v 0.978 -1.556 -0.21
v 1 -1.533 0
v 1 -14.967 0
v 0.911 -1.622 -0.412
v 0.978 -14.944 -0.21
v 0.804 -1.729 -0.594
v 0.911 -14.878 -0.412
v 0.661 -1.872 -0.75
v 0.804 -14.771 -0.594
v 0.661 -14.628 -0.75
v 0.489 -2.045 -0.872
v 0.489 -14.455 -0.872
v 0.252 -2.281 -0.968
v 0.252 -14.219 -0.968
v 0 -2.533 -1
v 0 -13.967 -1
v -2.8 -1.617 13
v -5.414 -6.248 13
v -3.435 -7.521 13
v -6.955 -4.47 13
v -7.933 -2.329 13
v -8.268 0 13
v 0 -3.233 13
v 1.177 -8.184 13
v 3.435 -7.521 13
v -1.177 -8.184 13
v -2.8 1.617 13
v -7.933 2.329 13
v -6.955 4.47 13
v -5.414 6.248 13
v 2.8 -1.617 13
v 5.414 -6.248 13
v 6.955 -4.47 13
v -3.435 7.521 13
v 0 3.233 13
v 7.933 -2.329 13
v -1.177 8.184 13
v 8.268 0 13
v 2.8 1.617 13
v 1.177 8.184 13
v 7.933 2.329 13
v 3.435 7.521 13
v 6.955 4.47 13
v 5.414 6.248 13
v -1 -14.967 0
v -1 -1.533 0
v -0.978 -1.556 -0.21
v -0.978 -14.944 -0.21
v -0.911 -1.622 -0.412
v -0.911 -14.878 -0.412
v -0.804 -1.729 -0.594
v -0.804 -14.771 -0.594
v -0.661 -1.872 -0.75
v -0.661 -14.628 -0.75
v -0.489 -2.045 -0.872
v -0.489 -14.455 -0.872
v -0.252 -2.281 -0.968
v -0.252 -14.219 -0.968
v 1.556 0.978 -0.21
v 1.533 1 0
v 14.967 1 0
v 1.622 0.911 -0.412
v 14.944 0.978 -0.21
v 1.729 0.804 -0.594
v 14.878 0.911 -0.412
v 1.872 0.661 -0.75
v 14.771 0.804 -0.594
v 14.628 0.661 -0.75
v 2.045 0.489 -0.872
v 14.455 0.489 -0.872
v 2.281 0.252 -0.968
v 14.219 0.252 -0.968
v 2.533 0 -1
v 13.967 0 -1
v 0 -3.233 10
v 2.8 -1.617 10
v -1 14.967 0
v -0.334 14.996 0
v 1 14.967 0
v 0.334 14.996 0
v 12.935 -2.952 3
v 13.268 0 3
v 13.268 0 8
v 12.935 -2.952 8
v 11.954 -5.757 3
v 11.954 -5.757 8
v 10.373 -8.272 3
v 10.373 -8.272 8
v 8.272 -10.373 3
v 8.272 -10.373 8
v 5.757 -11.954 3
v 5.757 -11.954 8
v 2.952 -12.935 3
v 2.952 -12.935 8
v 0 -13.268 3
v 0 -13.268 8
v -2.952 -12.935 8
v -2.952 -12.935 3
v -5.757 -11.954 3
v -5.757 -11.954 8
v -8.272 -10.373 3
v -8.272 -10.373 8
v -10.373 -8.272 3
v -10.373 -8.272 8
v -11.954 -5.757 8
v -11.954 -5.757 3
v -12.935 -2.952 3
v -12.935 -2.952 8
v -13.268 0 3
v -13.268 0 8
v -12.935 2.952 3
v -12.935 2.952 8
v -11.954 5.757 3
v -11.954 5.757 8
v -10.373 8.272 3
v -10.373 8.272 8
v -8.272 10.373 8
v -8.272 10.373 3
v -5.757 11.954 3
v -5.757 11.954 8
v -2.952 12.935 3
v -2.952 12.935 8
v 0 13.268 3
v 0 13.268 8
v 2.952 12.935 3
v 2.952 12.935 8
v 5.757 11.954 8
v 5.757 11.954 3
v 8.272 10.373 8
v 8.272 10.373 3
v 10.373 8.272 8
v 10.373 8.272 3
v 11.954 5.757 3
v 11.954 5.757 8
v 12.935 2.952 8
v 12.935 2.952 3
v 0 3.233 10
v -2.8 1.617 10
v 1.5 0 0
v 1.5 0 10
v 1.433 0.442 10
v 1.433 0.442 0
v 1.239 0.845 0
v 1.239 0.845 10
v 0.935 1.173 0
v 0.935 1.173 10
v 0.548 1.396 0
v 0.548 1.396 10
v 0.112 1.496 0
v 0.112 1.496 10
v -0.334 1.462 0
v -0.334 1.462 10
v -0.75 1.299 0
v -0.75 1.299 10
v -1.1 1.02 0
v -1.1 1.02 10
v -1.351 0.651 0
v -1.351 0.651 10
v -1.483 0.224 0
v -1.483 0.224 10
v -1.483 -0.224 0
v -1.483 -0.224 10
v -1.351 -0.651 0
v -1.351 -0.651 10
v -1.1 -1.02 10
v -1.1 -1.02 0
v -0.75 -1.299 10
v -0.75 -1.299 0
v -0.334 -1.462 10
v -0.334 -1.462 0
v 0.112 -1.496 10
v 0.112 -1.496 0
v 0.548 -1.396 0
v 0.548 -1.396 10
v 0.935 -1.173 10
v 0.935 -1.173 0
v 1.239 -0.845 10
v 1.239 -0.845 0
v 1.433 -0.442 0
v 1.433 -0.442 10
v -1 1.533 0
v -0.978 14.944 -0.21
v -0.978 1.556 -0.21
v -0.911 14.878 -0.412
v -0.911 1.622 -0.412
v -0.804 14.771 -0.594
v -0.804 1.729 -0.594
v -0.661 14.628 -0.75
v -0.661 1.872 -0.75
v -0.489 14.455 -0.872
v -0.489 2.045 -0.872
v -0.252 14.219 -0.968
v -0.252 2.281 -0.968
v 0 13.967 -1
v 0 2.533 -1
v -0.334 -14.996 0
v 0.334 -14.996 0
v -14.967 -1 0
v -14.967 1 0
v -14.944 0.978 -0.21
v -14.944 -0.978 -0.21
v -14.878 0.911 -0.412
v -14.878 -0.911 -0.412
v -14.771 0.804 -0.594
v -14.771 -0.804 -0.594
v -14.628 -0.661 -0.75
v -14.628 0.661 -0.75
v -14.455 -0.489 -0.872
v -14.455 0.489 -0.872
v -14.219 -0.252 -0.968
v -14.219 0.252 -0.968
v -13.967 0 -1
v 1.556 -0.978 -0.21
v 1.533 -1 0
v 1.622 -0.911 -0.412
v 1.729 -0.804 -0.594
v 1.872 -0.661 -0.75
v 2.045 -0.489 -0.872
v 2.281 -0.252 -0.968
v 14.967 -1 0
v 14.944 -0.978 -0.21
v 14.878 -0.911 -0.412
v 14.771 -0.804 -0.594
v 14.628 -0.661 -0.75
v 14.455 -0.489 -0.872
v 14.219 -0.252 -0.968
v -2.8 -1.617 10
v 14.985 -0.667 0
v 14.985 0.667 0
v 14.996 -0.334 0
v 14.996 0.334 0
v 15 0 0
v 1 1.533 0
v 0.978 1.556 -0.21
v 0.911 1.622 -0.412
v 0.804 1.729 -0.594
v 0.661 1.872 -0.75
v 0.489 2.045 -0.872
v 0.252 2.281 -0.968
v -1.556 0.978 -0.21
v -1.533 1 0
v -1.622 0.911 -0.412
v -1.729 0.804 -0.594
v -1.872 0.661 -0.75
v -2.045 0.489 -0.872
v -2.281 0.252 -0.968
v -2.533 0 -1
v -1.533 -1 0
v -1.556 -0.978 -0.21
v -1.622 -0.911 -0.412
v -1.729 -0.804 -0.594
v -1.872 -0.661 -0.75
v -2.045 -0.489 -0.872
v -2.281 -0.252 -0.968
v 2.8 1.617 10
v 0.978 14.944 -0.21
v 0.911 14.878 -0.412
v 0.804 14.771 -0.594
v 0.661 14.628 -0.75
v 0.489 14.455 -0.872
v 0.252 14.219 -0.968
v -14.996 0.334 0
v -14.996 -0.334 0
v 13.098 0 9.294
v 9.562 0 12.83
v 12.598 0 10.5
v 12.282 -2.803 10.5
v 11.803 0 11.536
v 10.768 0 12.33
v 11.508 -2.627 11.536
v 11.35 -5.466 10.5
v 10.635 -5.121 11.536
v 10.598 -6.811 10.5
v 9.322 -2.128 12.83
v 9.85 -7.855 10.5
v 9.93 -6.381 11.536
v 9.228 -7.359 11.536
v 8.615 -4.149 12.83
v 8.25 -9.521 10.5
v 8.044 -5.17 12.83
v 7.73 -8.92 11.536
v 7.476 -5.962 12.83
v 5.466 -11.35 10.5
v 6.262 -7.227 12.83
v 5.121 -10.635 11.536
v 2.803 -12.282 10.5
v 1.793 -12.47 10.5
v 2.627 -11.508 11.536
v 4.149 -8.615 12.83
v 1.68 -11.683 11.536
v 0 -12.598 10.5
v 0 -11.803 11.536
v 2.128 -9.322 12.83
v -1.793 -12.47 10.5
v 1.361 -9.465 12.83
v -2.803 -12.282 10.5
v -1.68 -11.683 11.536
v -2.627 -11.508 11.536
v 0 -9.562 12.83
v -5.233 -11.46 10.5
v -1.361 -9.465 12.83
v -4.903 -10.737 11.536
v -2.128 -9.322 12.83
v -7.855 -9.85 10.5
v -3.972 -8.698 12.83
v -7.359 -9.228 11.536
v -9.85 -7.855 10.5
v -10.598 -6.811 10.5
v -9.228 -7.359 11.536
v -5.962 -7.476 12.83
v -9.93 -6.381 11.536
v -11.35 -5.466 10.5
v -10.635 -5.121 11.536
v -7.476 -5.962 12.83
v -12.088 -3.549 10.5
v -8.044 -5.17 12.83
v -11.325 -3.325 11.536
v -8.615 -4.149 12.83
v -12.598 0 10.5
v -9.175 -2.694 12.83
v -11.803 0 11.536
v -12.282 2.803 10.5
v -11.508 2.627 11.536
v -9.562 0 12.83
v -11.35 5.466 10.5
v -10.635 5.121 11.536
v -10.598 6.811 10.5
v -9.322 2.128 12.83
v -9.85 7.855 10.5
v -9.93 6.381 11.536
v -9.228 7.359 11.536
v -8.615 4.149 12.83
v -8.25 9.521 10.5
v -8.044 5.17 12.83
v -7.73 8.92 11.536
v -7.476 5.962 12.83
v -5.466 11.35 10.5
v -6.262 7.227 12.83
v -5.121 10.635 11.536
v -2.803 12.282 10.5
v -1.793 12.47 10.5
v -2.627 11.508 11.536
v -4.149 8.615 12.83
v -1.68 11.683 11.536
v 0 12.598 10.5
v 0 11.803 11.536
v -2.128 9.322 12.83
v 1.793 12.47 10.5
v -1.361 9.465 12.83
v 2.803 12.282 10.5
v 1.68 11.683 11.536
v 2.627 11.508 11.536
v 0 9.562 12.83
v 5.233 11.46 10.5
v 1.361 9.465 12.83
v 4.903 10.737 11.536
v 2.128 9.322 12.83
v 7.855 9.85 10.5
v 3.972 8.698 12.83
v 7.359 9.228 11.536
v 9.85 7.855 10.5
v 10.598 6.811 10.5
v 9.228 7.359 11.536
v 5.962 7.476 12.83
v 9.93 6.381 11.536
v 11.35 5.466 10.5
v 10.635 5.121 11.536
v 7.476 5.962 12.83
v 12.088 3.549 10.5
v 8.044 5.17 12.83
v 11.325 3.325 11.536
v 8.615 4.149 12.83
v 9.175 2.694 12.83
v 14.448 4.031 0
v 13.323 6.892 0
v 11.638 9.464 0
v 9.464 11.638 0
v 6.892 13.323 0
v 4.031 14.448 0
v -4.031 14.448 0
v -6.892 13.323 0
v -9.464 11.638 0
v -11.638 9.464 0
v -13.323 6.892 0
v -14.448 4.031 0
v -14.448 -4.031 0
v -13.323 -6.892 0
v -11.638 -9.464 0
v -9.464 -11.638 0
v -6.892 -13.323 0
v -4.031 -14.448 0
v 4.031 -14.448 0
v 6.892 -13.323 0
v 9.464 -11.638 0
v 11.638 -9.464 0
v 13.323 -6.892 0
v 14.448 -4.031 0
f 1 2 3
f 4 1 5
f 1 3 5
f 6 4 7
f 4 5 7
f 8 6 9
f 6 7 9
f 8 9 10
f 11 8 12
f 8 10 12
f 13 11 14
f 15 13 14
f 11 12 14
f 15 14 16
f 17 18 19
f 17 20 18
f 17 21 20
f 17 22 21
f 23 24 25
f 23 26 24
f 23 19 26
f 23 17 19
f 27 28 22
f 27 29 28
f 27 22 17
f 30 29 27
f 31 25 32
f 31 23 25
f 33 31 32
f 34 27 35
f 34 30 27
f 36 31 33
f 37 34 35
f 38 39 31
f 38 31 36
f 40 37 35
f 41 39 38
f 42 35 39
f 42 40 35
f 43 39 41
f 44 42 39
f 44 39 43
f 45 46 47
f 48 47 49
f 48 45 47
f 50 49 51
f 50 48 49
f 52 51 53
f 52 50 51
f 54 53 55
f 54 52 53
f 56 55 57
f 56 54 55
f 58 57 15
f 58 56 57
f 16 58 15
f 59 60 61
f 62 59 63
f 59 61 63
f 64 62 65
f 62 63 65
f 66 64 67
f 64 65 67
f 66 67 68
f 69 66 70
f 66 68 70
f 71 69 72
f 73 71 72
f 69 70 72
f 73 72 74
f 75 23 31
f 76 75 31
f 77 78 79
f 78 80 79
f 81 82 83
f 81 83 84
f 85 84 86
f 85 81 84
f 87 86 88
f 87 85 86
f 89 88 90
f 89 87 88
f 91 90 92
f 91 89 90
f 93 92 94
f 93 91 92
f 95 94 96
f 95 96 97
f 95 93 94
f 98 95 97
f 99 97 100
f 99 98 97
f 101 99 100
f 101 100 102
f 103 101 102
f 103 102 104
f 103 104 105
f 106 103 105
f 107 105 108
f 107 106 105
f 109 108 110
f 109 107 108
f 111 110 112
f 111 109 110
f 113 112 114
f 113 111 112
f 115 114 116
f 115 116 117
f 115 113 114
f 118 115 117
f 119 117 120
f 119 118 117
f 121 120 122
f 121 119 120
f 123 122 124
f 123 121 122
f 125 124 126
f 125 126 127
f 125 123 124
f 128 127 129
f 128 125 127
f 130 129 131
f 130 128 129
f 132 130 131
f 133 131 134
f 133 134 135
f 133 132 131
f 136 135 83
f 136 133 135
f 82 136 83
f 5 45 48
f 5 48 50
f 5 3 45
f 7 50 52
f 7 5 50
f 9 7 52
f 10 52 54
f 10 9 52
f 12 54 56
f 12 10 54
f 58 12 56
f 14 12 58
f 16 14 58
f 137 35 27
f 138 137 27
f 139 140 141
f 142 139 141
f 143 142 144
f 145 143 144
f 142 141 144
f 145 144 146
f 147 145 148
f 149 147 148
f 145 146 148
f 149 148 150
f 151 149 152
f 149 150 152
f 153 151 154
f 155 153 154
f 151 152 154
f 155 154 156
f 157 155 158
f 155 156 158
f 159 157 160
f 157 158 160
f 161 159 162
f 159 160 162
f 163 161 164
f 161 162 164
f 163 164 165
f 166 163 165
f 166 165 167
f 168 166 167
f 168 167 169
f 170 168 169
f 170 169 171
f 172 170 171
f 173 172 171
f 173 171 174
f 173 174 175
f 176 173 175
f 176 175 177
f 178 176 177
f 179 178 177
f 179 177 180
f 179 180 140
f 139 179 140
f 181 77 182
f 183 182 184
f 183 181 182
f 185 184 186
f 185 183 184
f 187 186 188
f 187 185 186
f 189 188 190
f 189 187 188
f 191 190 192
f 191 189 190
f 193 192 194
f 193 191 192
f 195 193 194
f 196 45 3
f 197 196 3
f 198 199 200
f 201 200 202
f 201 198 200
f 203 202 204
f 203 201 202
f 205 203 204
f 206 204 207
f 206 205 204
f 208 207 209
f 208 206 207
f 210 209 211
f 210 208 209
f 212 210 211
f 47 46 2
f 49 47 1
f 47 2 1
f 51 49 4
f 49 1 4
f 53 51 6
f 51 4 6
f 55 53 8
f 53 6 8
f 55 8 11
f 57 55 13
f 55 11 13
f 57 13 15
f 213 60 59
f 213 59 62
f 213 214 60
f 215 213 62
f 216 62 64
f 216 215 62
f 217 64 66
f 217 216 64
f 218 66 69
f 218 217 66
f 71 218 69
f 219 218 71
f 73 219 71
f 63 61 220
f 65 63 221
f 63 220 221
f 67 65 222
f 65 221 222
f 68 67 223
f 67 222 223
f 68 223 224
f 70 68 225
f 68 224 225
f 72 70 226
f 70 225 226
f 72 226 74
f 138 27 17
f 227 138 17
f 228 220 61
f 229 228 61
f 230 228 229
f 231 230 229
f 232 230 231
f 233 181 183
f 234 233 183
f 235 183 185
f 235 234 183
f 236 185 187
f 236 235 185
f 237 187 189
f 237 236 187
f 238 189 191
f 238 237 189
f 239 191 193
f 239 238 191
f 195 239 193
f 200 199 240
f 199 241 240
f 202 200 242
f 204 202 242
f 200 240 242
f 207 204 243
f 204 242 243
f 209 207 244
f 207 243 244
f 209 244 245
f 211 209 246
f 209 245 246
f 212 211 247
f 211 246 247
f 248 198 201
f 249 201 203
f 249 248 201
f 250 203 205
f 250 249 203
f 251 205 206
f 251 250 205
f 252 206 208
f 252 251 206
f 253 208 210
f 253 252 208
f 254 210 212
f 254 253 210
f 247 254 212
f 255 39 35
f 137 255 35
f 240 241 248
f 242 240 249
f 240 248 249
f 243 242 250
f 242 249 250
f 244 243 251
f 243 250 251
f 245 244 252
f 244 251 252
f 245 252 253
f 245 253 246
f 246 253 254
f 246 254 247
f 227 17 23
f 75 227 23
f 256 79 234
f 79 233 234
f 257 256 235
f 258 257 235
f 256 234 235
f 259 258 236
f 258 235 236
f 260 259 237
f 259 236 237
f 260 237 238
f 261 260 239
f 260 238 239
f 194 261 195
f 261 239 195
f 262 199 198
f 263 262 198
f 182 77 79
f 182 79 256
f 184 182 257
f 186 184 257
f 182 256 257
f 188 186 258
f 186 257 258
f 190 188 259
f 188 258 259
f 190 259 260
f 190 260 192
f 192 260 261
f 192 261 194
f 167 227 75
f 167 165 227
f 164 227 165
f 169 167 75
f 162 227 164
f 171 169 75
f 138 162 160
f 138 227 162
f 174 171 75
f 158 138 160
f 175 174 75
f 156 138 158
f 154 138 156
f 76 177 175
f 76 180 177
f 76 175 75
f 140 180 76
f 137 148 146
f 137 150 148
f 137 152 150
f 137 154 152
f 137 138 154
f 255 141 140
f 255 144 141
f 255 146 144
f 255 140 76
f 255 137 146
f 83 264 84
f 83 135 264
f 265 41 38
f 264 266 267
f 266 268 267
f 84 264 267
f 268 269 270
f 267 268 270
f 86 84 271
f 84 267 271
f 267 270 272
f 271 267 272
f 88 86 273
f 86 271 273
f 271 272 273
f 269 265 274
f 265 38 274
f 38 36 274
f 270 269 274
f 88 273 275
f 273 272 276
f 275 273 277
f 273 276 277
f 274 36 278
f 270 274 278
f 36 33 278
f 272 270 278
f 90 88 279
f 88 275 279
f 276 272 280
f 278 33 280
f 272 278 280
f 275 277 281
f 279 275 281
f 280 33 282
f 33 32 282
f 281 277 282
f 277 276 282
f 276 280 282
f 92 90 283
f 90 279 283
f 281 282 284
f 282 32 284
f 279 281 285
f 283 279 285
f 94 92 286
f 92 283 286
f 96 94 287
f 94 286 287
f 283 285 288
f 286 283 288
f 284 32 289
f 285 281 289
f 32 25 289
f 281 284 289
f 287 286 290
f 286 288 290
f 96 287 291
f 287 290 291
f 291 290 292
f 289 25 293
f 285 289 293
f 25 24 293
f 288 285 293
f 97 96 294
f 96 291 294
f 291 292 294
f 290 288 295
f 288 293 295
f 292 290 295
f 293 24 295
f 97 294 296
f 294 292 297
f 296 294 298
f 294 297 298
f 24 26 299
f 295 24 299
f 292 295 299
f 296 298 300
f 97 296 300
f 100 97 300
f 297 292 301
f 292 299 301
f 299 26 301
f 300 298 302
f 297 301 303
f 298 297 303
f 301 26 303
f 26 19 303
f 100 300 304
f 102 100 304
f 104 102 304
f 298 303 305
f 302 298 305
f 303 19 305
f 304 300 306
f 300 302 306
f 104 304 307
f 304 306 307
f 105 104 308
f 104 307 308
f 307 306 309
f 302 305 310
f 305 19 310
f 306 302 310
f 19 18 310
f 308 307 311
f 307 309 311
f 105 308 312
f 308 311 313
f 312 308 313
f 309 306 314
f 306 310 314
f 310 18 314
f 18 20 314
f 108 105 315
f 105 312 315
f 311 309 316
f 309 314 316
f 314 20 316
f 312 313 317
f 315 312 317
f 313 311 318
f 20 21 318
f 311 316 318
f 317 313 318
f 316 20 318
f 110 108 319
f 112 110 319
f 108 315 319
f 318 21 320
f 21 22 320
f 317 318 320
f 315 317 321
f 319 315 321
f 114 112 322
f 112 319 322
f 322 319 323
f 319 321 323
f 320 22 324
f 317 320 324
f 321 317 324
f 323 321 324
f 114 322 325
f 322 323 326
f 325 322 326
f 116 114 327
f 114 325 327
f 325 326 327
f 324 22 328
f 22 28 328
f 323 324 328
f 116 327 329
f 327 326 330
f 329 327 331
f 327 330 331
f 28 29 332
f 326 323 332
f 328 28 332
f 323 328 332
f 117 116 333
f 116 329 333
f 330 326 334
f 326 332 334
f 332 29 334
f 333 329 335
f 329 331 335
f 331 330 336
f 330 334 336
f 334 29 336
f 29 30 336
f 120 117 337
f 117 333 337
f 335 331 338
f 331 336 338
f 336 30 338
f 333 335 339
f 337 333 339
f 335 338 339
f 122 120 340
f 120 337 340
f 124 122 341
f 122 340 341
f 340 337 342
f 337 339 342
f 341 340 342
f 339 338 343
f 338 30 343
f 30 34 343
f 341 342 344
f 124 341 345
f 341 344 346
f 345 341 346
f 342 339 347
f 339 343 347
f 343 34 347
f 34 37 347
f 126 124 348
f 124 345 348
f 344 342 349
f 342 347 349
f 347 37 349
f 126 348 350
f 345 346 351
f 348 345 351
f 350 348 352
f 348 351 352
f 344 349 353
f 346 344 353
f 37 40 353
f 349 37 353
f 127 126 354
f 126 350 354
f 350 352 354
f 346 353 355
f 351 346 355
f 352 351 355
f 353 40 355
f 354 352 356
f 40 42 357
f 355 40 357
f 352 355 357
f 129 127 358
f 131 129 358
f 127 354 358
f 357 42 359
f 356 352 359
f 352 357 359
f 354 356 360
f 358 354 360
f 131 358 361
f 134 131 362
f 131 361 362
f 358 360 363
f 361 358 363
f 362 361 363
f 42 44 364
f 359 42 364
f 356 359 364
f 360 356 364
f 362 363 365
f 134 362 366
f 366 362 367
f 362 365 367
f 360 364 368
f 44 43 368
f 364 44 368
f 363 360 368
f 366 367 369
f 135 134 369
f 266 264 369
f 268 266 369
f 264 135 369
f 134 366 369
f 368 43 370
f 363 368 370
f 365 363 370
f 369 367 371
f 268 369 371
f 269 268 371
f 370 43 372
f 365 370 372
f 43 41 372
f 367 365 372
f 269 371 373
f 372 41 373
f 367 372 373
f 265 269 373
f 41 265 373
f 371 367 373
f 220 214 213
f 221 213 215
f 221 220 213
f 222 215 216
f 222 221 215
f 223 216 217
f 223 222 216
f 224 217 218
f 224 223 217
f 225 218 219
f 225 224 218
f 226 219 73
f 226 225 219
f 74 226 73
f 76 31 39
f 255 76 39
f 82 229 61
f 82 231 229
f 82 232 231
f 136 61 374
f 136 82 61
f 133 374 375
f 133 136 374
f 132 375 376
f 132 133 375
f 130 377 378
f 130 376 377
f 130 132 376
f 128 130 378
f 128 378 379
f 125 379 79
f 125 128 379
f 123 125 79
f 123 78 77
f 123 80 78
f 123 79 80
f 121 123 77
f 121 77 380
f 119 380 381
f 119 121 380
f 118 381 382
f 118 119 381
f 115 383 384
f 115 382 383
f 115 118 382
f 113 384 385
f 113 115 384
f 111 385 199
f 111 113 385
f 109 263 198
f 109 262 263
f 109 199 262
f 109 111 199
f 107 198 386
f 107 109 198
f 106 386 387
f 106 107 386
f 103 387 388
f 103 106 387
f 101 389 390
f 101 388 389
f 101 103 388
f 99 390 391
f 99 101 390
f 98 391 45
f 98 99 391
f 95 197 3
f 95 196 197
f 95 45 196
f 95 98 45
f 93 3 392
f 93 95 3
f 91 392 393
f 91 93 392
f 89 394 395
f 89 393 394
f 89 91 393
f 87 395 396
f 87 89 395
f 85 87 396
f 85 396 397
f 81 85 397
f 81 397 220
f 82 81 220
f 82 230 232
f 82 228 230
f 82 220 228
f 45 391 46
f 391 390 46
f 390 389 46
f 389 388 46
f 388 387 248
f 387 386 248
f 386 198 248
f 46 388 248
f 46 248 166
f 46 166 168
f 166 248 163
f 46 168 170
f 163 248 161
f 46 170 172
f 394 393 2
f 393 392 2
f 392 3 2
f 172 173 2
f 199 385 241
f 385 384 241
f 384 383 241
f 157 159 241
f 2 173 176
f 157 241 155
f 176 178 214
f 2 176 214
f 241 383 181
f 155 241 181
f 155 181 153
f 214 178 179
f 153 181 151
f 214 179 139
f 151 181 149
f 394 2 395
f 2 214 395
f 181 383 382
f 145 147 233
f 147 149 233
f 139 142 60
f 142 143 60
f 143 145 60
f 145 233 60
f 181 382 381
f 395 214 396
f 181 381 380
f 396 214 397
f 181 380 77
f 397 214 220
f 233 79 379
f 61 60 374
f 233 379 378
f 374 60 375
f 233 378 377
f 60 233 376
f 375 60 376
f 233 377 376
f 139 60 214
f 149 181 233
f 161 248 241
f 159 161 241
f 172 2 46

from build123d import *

# Parameters (mm, degrees)
F0_R     = 15
F1_DEPTH = 3
F1_TAPER = 30
F2_DEPTH = 10
F4_DEPTH = 3
F5_R     = 1.5
F6_DEPTH = 10.001
F7_W     = 13.4332590942
F7_H     = 2
F7_W_2   = 2
F7_H_2   = 13.4332590942
F8_DEPTH = 1
F9_R     = 0.99999
F10_R    = 5


# Not quite as in the source:
# - a fillet or chamfer is up to 0.001 mm smaller than in the source, because OpenCascade refuses the exact size


with BuildPart() as f1:
    # F0 (on Top) → F1 (new body)
    with BuildSketch(Plane.XY):
        Circle(F0_R)
    extrude(amount=F1_DEPTH, taper=F1_TAPER)

    # F2 (add): a face of the model
    f2_faces = [f1.faces().sort_by_distance(p)[0] for p in [
        (0, 0, 3),
    ]]
    extrude(f2_faces, amount=F2_DEPTH)

    # F3 (on face) → F4 (cut)
    with BuildSketch(Plane.XY.offset(13)):
        Polygon((2.8, -1.6165807537), (2.8, 1.6165807537), (0, 3.2331615075), (-2.8, 1.6165807537), (-2.8, -1.6165807537), (0, -3.2331615075), align=None)
    extrude(amount=-F4_DEPTH, mode=Mode.SUBTRACT)

    # F5 (on face) → F6 (cut, through all)
    with BuildSketch(Plane.XY.offset(10)):
        Circle(F5_R)
    extrude(amount=-F6_DEPTH, mode=Mode.SUBTRACT)

    # F7 (on face) → F8 (join)
    with BuildSketch(Plane(origin=(0, 0, 0), x_dir=(1, 0, 0), z_dir=(0, 0, -1))):
        with Locations((-8.25, 0)):
            Rectangle(F7_W, F7_H)
        with Locations((0, 8.25)):
            Rectangle(F7_W_2, F7_H_2)
        with Locations((8.25, 0)):
            Rectangle(F7_W, F7_H)
        with Locations((0, -8.25)):
            Rectangle(F7_W_2, F7_H_2)
    extrude(amount=F8_DEPTH)

    # F9 (radius 1 in the source; OpenCascade refuses exactly that, so slightly less here)
    f9_edges = [f1.edges().sort_by_distance(p)[0] for p in [
        (-1, 8.25, -1),
        (1, 8.25, -1),
        (8.25, 1, -1),
        (14.96663, 0, -1),
        (8.25, -1, -1),
        (1.53337, 0, -1),
        (-8.25, 1, -1),
        (-8.25, -1, -1),
        (1, -8.25, -1),
        (-1, -8.25, -1),
        (0, 14.96663, -1),
        (0, 1.53337, -1),
        (0, -1.53337, -1),
        (-1.53337, 0, -1),
        (-14.96663, 0, -1),
        (0, -14.96663, -1),
    ]]
    fillet(f9_edges, radius=F9_R)

    # F10
    f10_edges = [f1.edges().sort_by_distance(p)[0] for p in [
        (-13.267949, 0, 13),
    ]]
    fillet(f10_edges, radius=F10_R)


solid = f1.part
